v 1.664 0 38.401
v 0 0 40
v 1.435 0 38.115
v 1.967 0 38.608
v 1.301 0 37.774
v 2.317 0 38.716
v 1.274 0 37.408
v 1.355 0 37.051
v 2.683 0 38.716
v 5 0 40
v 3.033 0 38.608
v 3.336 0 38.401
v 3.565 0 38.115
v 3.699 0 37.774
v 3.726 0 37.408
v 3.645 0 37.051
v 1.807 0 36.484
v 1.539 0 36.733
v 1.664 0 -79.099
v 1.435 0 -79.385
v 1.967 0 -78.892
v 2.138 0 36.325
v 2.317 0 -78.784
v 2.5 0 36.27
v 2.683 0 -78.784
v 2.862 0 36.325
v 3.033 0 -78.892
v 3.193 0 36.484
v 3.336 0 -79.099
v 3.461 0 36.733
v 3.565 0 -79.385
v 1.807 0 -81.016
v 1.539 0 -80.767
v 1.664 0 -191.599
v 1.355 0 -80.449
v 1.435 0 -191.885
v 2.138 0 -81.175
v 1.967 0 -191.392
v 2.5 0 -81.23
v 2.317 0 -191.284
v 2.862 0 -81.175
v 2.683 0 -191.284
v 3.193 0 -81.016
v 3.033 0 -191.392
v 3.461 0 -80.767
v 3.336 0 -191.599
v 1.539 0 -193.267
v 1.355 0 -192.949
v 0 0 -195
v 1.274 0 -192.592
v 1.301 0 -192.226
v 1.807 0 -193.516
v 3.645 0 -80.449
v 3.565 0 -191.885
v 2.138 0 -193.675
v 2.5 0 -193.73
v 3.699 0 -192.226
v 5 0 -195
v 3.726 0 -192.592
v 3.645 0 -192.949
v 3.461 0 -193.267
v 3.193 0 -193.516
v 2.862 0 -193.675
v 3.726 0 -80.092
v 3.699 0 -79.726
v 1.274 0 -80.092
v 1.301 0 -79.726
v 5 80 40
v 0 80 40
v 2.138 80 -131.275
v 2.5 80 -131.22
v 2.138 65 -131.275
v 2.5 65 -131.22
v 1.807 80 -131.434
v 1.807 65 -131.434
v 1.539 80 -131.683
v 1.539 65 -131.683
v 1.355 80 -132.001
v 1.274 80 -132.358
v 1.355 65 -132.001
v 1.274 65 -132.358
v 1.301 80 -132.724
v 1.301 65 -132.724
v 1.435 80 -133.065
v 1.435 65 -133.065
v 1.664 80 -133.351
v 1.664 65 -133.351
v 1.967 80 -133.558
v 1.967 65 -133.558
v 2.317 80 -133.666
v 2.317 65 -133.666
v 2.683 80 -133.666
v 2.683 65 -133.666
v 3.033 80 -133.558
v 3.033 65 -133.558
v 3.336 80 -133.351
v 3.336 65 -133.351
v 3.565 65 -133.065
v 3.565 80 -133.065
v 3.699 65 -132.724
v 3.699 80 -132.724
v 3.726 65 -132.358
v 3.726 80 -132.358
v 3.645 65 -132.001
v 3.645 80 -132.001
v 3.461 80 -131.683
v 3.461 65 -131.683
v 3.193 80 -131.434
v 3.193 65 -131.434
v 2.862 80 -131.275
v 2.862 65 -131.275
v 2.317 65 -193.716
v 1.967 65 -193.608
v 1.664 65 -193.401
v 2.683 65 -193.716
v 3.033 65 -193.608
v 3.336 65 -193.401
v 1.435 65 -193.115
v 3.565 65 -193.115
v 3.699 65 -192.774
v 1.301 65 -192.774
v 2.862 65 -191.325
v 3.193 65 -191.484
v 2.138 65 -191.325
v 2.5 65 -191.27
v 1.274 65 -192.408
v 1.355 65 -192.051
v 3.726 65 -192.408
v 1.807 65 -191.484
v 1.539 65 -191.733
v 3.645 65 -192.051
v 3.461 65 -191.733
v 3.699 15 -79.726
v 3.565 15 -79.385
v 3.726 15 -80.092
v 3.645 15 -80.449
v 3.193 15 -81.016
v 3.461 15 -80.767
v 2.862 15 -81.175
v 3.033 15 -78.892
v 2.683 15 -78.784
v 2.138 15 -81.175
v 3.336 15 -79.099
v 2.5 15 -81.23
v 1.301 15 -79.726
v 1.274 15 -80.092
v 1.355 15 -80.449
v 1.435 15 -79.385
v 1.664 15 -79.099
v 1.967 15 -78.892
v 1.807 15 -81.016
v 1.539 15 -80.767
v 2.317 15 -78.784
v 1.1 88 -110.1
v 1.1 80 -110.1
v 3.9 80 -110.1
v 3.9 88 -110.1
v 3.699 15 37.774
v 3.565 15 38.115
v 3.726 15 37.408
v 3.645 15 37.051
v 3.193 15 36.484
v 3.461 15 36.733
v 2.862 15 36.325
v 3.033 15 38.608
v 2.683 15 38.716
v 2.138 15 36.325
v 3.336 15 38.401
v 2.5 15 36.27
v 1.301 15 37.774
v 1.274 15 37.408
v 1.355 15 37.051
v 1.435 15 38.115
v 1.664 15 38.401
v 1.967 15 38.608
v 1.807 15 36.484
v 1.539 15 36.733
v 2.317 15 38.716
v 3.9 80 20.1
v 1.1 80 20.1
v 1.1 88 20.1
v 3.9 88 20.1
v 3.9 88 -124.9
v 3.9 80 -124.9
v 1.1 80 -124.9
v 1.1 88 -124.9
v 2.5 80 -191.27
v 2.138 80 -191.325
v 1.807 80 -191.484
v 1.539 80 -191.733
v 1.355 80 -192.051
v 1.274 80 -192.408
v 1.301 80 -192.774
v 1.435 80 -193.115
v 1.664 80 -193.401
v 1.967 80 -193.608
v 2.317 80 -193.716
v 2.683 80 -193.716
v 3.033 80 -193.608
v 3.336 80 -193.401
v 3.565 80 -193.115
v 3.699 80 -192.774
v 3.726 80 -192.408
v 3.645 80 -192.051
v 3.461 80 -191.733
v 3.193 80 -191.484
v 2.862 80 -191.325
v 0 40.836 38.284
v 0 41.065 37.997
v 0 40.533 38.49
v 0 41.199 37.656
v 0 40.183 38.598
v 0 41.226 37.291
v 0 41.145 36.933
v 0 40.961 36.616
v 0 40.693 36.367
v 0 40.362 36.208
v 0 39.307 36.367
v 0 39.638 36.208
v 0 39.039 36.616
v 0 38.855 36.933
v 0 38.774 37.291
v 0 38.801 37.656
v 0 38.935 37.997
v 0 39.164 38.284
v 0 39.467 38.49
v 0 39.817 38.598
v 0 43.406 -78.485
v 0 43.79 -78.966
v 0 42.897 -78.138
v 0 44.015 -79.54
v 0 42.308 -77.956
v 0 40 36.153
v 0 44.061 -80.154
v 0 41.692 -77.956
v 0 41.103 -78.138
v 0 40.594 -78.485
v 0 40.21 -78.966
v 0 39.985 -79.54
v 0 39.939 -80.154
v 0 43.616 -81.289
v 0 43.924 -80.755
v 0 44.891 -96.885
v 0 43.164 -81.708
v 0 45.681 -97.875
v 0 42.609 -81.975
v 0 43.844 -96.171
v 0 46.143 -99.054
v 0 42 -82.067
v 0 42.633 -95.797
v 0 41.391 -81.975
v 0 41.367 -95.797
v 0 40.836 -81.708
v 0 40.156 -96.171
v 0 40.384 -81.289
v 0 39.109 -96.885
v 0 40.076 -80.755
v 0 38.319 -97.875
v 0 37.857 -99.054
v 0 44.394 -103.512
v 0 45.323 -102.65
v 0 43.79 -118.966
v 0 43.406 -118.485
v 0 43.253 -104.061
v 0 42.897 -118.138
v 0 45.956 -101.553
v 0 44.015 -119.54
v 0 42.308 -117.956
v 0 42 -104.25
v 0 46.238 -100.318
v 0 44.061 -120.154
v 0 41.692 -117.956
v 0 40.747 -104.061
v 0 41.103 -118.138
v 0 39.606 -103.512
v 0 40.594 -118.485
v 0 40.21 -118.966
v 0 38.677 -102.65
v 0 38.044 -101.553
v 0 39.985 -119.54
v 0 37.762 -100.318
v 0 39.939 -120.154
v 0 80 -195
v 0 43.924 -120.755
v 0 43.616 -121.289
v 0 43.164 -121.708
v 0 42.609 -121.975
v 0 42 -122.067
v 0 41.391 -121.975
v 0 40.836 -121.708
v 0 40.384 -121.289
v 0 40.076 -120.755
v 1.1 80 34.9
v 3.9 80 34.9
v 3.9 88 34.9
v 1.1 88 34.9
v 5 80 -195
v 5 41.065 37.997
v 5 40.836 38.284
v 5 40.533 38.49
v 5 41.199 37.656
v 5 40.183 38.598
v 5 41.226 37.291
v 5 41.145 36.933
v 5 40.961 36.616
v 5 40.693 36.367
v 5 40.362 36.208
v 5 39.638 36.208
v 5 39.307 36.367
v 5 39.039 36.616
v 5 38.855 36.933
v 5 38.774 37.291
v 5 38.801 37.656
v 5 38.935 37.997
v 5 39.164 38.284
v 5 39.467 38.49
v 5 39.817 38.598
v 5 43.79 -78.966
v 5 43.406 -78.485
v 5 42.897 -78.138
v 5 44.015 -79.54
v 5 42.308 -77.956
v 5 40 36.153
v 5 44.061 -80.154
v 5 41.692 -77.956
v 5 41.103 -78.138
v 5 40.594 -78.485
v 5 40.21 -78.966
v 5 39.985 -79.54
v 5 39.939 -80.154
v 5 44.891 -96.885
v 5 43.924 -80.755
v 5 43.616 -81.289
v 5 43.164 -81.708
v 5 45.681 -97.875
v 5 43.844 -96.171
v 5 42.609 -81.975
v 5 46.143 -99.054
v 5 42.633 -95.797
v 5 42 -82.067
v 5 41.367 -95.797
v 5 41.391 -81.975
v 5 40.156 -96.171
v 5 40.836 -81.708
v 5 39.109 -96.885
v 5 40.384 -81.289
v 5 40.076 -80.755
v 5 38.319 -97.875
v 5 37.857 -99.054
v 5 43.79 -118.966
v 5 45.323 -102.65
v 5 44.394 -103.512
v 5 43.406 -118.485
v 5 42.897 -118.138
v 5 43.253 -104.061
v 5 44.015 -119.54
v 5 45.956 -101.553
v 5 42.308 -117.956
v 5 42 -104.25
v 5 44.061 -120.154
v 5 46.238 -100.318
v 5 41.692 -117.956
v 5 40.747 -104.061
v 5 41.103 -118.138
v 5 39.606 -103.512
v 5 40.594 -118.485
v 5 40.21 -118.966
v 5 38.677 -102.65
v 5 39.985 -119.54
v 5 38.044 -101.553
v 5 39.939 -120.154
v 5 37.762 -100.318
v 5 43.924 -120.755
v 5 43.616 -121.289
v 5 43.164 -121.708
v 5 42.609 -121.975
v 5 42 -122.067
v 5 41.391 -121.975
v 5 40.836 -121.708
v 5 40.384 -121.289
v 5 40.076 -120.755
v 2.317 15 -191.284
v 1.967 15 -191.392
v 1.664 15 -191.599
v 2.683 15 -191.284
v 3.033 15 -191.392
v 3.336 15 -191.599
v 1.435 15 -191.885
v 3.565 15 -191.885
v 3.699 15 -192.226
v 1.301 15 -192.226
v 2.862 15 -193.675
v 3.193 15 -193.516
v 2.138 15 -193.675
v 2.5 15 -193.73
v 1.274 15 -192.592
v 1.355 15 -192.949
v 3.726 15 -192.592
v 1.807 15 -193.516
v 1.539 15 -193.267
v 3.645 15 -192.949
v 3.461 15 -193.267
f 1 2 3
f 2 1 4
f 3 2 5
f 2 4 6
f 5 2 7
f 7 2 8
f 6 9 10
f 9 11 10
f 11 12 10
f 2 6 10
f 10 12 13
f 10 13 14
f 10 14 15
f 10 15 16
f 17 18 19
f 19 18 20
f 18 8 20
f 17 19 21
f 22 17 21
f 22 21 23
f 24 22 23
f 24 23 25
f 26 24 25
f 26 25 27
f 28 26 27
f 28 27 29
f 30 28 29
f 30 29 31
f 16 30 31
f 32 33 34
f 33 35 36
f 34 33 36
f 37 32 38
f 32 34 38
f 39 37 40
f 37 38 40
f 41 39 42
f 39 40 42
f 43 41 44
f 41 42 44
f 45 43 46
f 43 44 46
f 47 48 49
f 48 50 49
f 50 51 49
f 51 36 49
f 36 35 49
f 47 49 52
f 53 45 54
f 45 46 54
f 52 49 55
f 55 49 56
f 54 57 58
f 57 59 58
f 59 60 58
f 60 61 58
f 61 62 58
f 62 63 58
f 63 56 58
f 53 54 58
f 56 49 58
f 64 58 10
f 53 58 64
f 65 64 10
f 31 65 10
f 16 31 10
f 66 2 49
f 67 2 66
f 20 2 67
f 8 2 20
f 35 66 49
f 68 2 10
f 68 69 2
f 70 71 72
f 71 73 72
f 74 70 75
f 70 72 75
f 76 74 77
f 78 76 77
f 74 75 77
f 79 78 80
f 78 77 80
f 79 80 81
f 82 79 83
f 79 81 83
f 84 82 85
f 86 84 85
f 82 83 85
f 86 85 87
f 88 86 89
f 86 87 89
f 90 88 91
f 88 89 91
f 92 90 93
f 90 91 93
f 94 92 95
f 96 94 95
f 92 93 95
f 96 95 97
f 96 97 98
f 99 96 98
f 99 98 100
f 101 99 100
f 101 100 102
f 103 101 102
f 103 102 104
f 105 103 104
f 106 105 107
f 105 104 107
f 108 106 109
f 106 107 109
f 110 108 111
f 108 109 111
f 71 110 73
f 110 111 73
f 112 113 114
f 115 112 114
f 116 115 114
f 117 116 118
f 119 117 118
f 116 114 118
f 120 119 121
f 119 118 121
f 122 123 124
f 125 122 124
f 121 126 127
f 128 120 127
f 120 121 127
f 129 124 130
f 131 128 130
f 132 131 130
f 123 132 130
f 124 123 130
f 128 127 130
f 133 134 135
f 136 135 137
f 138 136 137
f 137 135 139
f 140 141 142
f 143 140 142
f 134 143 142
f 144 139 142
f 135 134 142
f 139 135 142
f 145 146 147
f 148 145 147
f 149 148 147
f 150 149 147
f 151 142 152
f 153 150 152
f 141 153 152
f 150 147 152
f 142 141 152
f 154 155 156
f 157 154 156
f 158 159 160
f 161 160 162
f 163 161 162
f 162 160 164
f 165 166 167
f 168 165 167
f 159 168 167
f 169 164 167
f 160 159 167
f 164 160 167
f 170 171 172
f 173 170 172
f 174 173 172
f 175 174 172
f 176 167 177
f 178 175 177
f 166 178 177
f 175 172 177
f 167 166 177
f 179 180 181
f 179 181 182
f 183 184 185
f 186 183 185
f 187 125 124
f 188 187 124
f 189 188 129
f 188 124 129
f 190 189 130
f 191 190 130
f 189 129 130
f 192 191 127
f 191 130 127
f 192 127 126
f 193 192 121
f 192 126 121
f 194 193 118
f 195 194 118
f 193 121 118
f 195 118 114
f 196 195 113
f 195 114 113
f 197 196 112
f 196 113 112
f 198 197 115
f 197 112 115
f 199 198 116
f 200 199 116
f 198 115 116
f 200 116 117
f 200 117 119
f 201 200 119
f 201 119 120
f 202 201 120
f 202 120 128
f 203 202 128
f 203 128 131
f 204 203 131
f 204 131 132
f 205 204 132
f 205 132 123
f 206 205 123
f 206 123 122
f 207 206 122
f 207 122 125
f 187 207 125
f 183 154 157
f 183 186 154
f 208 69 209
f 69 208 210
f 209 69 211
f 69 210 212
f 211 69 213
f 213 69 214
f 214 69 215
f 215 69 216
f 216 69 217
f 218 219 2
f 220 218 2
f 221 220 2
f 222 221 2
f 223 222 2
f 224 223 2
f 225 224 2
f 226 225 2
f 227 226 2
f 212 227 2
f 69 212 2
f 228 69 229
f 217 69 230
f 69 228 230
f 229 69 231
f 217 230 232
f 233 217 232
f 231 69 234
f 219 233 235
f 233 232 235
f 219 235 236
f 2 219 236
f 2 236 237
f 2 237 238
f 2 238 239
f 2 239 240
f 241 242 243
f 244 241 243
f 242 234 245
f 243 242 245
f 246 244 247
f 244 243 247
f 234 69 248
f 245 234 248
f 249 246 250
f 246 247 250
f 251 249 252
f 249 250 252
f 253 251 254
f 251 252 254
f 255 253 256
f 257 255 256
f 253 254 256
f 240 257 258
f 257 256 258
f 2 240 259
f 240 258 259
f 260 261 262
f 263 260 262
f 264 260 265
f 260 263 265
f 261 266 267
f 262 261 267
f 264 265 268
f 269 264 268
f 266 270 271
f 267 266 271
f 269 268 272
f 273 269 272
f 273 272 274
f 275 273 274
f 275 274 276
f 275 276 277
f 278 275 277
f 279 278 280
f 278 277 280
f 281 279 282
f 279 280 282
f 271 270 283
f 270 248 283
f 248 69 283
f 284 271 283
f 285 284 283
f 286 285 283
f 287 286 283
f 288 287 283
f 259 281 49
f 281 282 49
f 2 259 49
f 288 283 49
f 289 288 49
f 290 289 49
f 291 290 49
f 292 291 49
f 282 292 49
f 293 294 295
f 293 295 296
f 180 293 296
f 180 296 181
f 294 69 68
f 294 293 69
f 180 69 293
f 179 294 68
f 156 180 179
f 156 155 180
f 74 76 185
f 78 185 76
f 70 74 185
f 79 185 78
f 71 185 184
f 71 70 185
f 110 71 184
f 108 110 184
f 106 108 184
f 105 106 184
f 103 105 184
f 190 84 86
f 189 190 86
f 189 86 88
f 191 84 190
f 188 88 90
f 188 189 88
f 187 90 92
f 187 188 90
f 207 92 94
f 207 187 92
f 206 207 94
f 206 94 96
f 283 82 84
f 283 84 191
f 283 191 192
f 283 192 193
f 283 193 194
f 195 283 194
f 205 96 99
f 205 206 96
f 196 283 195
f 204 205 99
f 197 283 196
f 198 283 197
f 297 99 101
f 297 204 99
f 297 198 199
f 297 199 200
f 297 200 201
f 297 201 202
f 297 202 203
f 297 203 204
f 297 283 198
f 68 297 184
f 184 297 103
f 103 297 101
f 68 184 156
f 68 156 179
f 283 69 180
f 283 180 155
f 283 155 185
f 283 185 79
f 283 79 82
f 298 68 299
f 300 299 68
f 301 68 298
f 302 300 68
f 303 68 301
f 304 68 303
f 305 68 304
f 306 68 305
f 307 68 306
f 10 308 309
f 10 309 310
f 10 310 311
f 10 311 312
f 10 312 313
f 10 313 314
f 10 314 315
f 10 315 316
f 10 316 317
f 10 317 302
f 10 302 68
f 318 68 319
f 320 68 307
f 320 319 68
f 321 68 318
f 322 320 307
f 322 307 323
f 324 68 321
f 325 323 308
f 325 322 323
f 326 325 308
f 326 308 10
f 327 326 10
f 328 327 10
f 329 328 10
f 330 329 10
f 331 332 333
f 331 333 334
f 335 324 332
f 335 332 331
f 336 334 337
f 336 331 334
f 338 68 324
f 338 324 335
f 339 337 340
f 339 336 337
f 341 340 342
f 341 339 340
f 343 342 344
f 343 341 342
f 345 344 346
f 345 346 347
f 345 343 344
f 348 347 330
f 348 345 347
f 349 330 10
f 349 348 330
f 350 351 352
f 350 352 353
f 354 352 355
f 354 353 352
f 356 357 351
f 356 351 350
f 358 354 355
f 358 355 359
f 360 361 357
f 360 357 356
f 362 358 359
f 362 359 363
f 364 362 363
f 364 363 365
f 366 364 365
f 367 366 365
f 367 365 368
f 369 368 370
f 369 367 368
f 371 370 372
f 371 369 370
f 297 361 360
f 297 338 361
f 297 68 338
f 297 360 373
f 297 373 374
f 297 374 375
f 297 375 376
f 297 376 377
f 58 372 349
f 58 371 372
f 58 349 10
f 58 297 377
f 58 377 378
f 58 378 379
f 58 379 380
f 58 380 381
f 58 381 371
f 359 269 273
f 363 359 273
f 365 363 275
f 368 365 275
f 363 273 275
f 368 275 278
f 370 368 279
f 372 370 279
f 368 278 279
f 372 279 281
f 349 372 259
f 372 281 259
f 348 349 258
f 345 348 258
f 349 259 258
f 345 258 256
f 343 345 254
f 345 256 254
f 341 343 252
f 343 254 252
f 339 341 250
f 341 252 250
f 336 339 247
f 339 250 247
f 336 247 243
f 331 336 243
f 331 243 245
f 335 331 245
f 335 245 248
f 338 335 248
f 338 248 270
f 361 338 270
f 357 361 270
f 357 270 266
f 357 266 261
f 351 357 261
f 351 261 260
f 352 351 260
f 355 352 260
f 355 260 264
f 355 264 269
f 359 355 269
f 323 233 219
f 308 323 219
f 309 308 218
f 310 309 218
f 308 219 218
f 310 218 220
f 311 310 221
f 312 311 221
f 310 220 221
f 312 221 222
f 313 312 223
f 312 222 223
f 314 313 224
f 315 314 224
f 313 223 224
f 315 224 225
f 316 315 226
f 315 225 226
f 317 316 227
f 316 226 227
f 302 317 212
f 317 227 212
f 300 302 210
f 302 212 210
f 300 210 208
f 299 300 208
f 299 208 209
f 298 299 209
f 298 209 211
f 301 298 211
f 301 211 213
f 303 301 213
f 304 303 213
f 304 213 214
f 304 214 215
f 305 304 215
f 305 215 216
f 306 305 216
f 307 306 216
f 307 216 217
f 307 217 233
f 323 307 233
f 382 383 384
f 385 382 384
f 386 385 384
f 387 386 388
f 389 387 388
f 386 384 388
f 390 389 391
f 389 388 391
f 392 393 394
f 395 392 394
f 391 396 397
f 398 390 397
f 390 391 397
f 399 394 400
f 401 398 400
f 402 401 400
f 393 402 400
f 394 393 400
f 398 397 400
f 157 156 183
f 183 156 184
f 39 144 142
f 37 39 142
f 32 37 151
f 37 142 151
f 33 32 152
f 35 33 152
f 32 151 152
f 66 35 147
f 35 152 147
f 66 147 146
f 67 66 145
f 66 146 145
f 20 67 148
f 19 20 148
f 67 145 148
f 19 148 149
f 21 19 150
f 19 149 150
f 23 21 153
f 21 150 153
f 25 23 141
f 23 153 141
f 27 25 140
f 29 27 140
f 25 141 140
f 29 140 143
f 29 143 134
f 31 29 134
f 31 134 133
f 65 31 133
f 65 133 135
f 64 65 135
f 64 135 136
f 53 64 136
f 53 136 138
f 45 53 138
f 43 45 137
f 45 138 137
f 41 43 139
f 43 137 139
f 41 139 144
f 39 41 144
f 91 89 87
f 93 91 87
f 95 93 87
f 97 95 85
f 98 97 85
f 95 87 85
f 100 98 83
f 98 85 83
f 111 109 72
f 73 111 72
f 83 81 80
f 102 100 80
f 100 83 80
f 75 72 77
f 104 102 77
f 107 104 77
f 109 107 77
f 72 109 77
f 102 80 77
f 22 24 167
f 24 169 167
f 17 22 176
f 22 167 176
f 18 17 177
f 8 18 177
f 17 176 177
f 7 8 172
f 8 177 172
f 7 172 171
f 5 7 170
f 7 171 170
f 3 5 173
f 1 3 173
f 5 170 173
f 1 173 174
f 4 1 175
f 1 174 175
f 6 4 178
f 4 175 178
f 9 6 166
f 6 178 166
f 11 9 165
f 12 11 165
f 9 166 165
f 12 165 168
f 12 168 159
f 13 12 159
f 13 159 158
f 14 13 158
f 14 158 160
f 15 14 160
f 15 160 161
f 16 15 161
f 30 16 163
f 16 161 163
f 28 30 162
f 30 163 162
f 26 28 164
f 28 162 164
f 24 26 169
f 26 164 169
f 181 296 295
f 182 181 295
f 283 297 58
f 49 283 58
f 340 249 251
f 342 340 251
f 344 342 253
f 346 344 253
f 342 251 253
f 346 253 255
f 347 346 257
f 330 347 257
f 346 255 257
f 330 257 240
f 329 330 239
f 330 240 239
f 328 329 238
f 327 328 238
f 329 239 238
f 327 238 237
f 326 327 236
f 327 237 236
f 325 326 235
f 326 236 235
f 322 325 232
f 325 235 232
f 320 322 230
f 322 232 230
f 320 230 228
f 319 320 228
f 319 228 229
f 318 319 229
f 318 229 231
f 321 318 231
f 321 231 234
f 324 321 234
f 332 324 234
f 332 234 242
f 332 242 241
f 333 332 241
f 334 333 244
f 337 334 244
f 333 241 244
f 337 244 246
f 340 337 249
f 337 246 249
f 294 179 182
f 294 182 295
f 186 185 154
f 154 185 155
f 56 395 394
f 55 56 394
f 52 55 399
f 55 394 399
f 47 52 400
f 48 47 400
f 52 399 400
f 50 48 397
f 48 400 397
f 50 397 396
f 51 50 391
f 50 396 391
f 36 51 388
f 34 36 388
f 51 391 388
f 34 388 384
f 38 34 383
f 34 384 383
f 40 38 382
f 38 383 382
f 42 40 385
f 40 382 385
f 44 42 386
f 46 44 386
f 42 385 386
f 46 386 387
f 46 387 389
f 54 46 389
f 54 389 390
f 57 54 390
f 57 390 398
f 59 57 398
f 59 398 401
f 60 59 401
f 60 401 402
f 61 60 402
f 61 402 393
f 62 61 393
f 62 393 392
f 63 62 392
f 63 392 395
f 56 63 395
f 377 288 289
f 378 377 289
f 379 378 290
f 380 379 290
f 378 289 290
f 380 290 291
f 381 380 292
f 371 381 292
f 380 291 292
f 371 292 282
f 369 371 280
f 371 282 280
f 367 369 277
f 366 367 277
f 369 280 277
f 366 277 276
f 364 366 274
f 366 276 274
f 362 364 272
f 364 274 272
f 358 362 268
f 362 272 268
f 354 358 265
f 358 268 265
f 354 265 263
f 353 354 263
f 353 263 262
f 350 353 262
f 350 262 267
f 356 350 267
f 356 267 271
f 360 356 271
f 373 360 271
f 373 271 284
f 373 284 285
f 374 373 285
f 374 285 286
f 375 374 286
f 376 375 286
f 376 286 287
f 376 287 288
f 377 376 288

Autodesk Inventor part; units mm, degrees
ref_plane "YZ Plane" through (0, 0, 0) normal (1, 0, 0) x (0, 1, 0)
ref_plane "XZ Plane" through (0, 0, 0) normal (0, 1, 0) x (-1, 0, 0)
ref_plane "XY Plane" through (0, 0, 0) normal (0, 0, 1) x (1, 0, 0)
sketch "Esquisse1" plane through (0, 0, 0) normal (1, 0, 0) x (0, 1, 0)
  line L0 (0, 0) -> (80, 0)
  line L1 (80, 0) -> (80, -200)
  line L2 (80, -200) -> (0, -200)
  line L3 (0, -200) -> (0, 0)
  dimension "d0" = 80
  dimension "d1" = 200
extrude "Extrusion1" add sketch "Esquisse1" along normal blind 5
sketch "Esquisse7" plane through (5, 0, 0) normal (1, 0, 0) x (0, 0, -1)
  line L0 (0, 0) -> (100, 0)
  line L1 (0, 0) -> (200, 0) projected
  line L2 (100, 0) -> (180, 0) construction
  line L3 (100, 80) -> (100, 10)
  line L4 (100, 80) -> (170, 80) construction
  line L5 (120, 42) -> (80, 42)
  dimension "d50" = 100
  dimension "d54" = 90
  dimension "d80" = 40
hole "Perçage6" at (5, 42, -120) at (5, 42, -80) direction (-1, 0, 0) diameter 4.134 end through all thread size "M5x0.8" class "6H" standard "ISO Metric profile"
sketch "Esquisse8" plane through (5, 0, 0) normal (1, 0, 0) x (0, 0, -1)
  circle A0 centre (80, 42) radius 2.067 projected
  line L0 (80, 42) -> (100, 42)
  point P0 (0, 0)
hole "Perçage7" at (5, 42, -100) direction (-1, 0, 0) diameter 8.5 end through all
sketch "Esquisse9" plane through (0, 0, 0) normal (0, 0, 1) x (1, 0, 0)
  line L0 (0, 80) -> (0, 0) projected
  line L1 (0, 0) -> (5, 0) projected
  line L2 (5, 80) -> (5, 0) projected
  line L3 (0, 80) -> (5, 80) projected
extrude "Extrusion2" add sketch "Esquisse9" along normal blind 40
sketch "Esquisse5" plane through (0, 80, 0) normal (0, 1, 0) x (1, 0, 0)
  line L0 (0, 0) -> (5, 0) projected
  line L1 (2.5, 0) -> (5, 0) construction
  line L2 (0, 200) -> (0, 0) projected
  line L3 (0, 200) -> (5, 200) projected
  line L4 (0, 200) -> (0, 132.45)
  line L5 (0, 132.45) -> (2.5, 132.45)
  point P0 (2.5, 197.5)
  point P1 (0, -40)
  point P2 (2.5, 200)
  dimension "d84" = 2.5
  dimension "d85" = 2.5
  dimension "d86" = 67.55
hole "Perçage4" at (2.5, 80, -197.5) at (2.5, 80, -132.45) direction (0, -1, 0) diameter 2.459 depth 15 thread size "M3x0.5" class "6H" standard "ISO Metric profile"
sketch "Esquisse4" plane through (0, 0, -200) normal (0, -1, 0) x (1, 0, 0)
  line L0 (0, 0) -> (0, 200) projected
  line L1 (5, 200) -> (5, 0) projected
  line L2 (5, 240) -> (0, 240) projected
  line L3 (0, 240) -> (2.5, 240)
  line L4 (2.5, 237.5) -> (2.5, 240)
  line L5 (0, 240) -> (0, 120)
  line L6 (0, 0) -> (5, 0) projected
  line L7 (0, 120) -> (2.5, 120)
  point P0 (2.5, 2.5)
  point P1 (2.5, 0)
  dimension "d87" = 120
  dimension "d88" = 2.5
  dimension "d89" = 2.5
hole "Perçage3" at (2.5, 0, -197.5) at (2.5, 0, 37.5) at (2.5, 0, -80) direction (0, 1, 0) diameter 2.459 depth 15 thread size "M3x0.5" class "6H" standard "ISO Metric profile"
sketch "Esquisse3" plane through (5, 0, 0) normal (1, 0, 0) x (0, 0, -1)
  line L0 (0, 0) -> (200, 0) projected
  line L1 (-39.8826, 0) -> (-37.3826, 0)
  line L2 (-37.3826, 0) -> (-37.3826, 40)
  point P0 (197.5, 40)
  dimension "d90" = 2.5
  dimension "d91" = 40
hole "Perçage2" at (5, 40, -197.5) at (5, 40, 37.3826) direction (-1, 0, 0) diameter 2.459 end through all thread size "M3x0.5" class "6H" standard "ISO Metric profile"
sketch "Esquisse10" plane through (0, 80, -200) normal (0, 1, 0) x (1, 0, 0)
  line L0 (5, -240) -> (0, -240) projected
  line L1 (2.5, -240) -> (2.5, -234.9)
  line L2 (2.5, -234.9) -> (3.9, -234.9)
  line L3 (2.5, -234.9) -> (1.1, -234.9)
  line L4 (1.1, -234.9) -> (1.1, -220.1)
  line L5 (1.1, -220.1) -> (3.9, -220.1)
  line L6 (3.9, -220.1) -> (3.9, -234.9)
  line L7 (0, -240) -> (0, -89.9)
  line L8 (0, 0) -> (0, -240) projected
  line L9 (0, -89.9) -> (1.1, -89.9)
  line L10 (1.1, -89.9) -> (3.9, -89.9)
  line L11 (3.9, -89.9) -> (3.9, -75.1)
  line L12 (3.9, -75.1) -> (1.1, -75.1)
  line L13 (1.1, -75.1) -> (1.1, -89.9)
  point P0 (0, -200)
  dimension "d92" = 5.1
  dimension "d93" = 1.4
  dimension "d94" = 1.4
  dimension "d95" = 14.8
  dimension "d96" = 150.1
  dimension "d97" = 1.1
  dimension "d98" = 14.8
  dimension "d99" = 2.8
extrude "Extrusion3" add sketch "Esquisse10" along normal blind 8
sketch "Esquisse11" plane through (5, 0, 0) normal (1, 0, 0) x (0, 0, -1)
  line L0 (200, 80) -> (-40, 80) projected
  line L1 (200, 0) -> (-40, 0) projected
  line L2 (200, 80) -> (195, 80)
  line L3 (195, 80) -> (195, 0)
  line L4 (195, 0) -> (200, 0)
  line L5 (200, 0) -> (200, 80)
  point P0 (0, 0)
  dimension "d102" = 5
extrude "Extrusion4" cut sketch "Esquisse11" against normal blind 8
sketch "Esquisse12" plane through (0, 80, 40) normal (0, 1, 0) x (1, 0, 0)
  line L0 (0, 235) -> (0, 0) projected
  line L1 (0, 235) -> (2.5, 235)
  line L2 (0, 235) -> (5, 235) projected
  line L3 (2.5, 235) -> (2.5, 232.5)
  point P0 (0, 40)
  dimension "d105" = 2.5
  dimension "d106" = 2.5
hole "Perçage8" at (2.5, 80, -192.5) direction (0, -1, 0) diameter 2.459 depth 15 thread size "M3x0.5" class "6H" standard "ISO Metric profile"
sketch "Esquisse13" plane through (0, 0, 40) normal (0, -1, 0) x (1, 0, 0)
  line L0 (0, -235) -> (0, 0) projected
  line L1 (0, -235) -> (2.5, -235)
  line L2 (5, -235) -> (0, -235) projected
  circle A0 centre (2.5, -232.5) radius 1.2295 projected
  point P0 (0, -40)
hole "Perçage9" at (2.5, 0, -192.5) direction (0, 1, 0) diameter 2.459 depth 15 thread size "M3x0.5" class "6H" standard "ISO Metric profile"
properties part number "chassis_côté"
